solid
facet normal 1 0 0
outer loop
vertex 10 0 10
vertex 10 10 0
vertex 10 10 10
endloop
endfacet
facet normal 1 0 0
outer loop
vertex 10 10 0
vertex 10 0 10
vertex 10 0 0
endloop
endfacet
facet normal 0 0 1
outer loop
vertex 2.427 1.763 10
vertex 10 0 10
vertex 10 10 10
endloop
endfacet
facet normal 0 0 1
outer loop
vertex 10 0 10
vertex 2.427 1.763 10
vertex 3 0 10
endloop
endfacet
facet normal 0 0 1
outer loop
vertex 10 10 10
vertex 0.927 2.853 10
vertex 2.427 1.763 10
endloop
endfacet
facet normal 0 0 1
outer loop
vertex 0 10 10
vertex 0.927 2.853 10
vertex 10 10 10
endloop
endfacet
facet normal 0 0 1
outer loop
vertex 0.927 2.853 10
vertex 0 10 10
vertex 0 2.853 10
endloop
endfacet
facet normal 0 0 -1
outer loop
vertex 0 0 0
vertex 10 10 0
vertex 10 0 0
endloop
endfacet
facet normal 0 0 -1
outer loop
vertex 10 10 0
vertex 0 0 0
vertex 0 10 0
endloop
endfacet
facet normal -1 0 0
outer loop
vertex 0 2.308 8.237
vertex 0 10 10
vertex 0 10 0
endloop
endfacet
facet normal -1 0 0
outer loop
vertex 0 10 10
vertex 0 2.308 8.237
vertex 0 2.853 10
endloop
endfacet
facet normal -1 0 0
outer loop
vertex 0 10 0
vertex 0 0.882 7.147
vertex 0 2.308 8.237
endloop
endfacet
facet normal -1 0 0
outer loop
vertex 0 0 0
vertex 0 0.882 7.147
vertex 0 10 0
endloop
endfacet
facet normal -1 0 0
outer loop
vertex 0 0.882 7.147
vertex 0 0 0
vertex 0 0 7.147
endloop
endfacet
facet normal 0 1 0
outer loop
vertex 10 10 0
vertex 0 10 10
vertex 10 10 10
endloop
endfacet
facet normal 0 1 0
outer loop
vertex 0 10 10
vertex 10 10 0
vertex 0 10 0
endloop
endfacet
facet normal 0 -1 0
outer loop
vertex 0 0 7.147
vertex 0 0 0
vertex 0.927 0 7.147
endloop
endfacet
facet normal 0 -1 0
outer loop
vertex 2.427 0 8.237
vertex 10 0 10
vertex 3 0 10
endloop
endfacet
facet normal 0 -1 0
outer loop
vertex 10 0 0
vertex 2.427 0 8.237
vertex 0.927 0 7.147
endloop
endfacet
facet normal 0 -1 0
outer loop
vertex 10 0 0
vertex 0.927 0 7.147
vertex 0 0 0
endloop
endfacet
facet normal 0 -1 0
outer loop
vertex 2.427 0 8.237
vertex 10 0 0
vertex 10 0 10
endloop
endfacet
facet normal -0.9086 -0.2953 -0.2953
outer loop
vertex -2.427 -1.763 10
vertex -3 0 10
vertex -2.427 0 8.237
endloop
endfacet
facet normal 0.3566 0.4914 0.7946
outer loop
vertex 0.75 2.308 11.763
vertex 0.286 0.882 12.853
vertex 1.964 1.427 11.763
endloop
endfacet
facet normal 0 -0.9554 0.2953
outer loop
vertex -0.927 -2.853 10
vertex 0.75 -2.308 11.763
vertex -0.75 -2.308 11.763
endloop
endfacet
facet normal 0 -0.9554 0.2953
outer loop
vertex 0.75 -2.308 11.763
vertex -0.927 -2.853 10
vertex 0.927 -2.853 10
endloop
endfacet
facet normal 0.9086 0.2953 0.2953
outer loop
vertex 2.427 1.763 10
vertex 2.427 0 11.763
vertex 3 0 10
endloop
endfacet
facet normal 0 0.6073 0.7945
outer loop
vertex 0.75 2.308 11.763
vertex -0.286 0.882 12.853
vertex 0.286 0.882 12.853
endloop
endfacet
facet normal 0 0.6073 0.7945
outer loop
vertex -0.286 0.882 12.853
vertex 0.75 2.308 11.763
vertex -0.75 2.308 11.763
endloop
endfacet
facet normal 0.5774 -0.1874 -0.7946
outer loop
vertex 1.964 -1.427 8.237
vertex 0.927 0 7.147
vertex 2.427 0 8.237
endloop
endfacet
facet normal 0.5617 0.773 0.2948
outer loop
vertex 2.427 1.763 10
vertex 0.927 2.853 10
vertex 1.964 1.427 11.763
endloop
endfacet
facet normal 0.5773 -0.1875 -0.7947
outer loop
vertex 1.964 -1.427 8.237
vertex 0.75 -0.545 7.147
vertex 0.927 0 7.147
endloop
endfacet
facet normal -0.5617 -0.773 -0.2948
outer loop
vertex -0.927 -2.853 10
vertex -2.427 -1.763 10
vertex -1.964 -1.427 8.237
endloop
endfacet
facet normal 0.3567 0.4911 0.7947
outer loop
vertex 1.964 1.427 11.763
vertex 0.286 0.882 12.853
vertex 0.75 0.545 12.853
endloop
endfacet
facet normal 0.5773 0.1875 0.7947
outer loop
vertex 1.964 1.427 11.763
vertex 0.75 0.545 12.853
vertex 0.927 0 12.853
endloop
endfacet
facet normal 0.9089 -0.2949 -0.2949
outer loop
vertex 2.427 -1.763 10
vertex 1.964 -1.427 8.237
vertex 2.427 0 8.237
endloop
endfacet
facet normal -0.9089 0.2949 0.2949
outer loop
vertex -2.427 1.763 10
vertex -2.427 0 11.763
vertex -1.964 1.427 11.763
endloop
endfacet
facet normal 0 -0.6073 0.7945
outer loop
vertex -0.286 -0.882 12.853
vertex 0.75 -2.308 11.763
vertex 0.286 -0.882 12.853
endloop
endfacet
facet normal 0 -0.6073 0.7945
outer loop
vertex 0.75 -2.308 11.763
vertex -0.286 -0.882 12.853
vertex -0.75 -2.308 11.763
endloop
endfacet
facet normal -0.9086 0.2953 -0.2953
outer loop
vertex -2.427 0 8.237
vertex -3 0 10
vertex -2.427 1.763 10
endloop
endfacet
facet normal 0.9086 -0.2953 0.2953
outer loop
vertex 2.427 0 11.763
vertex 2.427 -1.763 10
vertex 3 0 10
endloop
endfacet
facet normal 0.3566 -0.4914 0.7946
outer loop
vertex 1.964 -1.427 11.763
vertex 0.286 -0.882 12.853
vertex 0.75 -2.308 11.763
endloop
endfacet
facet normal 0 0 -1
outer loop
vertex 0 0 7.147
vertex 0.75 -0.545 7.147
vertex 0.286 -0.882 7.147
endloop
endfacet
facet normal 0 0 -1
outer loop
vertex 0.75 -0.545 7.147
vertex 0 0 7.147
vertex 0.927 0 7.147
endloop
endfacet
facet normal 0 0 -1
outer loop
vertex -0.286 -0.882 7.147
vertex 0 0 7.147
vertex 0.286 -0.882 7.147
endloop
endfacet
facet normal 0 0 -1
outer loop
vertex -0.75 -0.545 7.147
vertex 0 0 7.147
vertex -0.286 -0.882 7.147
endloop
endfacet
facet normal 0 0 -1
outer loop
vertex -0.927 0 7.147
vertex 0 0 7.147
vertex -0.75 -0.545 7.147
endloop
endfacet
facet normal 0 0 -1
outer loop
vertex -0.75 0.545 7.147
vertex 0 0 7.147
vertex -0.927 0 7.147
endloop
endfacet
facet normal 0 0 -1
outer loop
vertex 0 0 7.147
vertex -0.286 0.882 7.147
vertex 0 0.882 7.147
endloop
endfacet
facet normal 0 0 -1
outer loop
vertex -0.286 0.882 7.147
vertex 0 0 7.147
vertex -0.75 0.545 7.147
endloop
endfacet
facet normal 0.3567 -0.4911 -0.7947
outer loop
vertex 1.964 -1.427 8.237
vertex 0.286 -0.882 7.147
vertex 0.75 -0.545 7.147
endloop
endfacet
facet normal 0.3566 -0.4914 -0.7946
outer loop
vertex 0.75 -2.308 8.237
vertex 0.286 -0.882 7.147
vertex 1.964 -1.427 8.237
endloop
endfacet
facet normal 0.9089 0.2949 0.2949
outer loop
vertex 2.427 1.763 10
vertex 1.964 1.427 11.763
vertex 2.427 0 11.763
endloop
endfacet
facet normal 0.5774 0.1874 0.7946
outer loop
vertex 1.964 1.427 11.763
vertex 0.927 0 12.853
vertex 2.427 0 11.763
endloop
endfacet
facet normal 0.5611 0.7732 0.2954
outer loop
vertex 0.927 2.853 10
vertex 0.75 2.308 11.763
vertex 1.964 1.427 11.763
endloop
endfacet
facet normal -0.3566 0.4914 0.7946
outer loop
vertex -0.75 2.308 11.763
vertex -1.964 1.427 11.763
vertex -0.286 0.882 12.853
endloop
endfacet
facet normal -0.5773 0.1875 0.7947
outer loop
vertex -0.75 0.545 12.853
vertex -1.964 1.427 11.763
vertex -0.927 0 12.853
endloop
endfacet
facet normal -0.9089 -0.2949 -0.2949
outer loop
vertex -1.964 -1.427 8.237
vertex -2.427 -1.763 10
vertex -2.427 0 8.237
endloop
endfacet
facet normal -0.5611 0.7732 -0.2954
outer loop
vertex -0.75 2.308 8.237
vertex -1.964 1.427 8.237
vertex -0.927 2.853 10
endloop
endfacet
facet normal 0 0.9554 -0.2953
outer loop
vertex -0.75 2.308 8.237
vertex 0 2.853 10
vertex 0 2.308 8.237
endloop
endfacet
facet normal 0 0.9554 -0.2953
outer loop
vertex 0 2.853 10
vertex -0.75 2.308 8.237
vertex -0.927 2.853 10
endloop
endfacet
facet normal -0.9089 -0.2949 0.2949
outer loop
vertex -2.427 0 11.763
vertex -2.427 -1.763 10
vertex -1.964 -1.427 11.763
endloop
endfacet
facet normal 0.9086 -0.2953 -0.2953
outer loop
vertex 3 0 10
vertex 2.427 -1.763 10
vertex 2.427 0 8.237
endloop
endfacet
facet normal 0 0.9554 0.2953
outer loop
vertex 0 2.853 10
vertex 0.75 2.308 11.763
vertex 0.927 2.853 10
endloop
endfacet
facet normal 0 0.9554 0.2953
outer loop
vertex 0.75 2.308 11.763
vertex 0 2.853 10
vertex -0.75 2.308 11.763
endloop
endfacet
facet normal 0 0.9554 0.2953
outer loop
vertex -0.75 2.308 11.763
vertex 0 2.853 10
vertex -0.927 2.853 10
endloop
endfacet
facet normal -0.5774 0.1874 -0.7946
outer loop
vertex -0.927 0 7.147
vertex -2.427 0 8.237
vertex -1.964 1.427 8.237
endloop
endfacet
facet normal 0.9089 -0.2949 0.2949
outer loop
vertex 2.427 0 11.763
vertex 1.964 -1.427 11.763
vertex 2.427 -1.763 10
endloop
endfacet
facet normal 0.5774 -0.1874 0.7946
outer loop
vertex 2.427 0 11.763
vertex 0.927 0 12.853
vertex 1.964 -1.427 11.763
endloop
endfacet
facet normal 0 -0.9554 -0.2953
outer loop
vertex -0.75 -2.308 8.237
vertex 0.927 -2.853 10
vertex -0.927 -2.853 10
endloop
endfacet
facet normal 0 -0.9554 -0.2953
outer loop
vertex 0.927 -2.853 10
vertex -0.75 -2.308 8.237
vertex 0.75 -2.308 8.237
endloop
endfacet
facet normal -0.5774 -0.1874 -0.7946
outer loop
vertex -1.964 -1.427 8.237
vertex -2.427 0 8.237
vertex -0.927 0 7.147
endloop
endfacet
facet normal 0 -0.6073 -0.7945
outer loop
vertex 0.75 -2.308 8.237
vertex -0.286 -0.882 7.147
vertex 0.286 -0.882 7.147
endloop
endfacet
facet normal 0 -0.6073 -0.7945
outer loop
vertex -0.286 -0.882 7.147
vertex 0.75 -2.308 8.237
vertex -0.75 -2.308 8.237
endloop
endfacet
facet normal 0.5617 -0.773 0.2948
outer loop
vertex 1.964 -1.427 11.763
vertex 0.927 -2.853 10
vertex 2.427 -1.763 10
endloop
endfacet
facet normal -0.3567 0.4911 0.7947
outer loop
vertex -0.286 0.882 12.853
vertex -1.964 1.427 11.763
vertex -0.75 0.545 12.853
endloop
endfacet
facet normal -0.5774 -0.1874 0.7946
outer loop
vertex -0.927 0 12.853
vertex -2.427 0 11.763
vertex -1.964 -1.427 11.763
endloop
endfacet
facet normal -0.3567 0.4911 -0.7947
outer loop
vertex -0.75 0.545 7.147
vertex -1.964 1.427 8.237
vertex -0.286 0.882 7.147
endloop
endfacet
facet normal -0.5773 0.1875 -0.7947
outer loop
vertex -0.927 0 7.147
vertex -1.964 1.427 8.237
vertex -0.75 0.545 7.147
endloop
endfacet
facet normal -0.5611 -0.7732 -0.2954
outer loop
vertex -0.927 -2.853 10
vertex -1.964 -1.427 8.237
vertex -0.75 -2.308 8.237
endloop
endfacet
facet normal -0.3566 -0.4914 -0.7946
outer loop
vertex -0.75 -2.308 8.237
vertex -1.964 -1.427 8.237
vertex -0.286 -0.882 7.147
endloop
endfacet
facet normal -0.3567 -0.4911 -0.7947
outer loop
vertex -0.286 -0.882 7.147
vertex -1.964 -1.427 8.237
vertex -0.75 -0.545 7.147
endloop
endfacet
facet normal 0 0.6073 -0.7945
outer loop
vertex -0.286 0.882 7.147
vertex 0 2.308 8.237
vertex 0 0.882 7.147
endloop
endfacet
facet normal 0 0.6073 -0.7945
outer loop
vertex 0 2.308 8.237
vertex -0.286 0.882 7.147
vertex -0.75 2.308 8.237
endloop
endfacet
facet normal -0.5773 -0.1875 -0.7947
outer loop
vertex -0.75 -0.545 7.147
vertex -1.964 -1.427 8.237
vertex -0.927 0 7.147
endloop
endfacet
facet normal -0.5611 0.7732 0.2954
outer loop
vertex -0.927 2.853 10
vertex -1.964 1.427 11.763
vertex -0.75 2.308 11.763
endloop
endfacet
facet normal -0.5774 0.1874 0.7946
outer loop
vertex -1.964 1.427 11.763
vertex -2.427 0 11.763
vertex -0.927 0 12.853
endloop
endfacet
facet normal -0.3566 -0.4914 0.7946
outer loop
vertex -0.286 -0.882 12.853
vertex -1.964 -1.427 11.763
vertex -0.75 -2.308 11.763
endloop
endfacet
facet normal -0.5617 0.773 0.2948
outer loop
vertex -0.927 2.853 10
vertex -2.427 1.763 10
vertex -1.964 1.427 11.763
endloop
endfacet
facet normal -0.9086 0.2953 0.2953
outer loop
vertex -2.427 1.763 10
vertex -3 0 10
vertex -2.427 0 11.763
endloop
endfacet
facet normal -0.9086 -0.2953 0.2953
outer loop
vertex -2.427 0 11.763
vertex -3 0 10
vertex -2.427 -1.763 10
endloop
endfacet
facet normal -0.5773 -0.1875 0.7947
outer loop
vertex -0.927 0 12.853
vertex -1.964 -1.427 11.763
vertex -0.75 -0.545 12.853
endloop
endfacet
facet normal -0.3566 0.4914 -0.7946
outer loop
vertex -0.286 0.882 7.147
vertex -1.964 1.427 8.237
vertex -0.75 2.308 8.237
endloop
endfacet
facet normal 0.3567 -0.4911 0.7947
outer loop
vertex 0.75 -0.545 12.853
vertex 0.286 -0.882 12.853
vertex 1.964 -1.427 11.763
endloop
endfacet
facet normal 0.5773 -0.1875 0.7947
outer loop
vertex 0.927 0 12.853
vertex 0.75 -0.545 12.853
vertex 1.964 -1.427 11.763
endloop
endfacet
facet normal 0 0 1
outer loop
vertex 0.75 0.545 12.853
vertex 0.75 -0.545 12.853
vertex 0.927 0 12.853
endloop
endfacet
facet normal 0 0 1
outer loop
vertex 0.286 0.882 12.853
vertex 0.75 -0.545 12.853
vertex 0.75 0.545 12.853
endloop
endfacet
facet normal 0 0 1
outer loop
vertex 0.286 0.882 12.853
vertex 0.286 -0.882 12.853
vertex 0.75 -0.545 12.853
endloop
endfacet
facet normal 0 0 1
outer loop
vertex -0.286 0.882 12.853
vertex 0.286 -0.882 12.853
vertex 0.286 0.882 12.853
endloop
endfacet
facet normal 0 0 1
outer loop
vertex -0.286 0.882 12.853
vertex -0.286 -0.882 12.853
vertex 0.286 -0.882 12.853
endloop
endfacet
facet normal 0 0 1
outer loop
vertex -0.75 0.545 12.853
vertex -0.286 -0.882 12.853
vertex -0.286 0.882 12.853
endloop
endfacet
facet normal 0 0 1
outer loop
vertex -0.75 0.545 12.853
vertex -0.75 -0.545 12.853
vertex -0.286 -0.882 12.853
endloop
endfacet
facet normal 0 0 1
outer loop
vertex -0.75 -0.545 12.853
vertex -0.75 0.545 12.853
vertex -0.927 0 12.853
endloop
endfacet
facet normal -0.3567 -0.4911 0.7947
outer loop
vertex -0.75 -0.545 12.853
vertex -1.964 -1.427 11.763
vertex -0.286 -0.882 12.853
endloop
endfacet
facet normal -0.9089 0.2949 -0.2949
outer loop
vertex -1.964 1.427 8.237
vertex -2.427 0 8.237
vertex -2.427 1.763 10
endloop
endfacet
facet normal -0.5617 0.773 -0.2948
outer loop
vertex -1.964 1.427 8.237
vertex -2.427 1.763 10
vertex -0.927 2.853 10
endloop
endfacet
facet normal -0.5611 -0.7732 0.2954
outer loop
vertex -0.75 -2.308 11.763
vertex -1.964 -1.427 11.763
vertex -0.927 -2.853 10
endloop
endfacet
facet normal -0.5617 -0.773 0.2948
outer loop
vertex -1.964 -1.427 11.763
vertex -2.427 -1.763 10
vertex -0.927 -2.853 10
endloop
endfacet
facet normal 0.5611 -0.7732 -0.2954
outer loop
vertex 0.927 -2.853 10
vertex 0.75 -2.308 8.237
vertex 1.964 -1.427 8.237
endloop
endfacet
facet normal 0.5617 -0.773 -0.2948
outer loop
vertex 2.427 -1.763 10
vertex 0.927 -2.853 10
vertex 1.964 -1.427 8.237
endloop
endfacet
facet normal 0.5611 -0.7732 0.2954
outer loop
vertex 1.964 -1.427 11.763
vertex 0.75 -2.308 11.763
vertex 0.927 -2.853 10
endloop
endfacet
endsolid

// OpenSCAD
// expect: Use children() instead
// fix: translate([0, 0, h]) children(0);
module on_top(h) translate([0, 0, h]) child();
cube(10);
on_top(10) sphere(3);
